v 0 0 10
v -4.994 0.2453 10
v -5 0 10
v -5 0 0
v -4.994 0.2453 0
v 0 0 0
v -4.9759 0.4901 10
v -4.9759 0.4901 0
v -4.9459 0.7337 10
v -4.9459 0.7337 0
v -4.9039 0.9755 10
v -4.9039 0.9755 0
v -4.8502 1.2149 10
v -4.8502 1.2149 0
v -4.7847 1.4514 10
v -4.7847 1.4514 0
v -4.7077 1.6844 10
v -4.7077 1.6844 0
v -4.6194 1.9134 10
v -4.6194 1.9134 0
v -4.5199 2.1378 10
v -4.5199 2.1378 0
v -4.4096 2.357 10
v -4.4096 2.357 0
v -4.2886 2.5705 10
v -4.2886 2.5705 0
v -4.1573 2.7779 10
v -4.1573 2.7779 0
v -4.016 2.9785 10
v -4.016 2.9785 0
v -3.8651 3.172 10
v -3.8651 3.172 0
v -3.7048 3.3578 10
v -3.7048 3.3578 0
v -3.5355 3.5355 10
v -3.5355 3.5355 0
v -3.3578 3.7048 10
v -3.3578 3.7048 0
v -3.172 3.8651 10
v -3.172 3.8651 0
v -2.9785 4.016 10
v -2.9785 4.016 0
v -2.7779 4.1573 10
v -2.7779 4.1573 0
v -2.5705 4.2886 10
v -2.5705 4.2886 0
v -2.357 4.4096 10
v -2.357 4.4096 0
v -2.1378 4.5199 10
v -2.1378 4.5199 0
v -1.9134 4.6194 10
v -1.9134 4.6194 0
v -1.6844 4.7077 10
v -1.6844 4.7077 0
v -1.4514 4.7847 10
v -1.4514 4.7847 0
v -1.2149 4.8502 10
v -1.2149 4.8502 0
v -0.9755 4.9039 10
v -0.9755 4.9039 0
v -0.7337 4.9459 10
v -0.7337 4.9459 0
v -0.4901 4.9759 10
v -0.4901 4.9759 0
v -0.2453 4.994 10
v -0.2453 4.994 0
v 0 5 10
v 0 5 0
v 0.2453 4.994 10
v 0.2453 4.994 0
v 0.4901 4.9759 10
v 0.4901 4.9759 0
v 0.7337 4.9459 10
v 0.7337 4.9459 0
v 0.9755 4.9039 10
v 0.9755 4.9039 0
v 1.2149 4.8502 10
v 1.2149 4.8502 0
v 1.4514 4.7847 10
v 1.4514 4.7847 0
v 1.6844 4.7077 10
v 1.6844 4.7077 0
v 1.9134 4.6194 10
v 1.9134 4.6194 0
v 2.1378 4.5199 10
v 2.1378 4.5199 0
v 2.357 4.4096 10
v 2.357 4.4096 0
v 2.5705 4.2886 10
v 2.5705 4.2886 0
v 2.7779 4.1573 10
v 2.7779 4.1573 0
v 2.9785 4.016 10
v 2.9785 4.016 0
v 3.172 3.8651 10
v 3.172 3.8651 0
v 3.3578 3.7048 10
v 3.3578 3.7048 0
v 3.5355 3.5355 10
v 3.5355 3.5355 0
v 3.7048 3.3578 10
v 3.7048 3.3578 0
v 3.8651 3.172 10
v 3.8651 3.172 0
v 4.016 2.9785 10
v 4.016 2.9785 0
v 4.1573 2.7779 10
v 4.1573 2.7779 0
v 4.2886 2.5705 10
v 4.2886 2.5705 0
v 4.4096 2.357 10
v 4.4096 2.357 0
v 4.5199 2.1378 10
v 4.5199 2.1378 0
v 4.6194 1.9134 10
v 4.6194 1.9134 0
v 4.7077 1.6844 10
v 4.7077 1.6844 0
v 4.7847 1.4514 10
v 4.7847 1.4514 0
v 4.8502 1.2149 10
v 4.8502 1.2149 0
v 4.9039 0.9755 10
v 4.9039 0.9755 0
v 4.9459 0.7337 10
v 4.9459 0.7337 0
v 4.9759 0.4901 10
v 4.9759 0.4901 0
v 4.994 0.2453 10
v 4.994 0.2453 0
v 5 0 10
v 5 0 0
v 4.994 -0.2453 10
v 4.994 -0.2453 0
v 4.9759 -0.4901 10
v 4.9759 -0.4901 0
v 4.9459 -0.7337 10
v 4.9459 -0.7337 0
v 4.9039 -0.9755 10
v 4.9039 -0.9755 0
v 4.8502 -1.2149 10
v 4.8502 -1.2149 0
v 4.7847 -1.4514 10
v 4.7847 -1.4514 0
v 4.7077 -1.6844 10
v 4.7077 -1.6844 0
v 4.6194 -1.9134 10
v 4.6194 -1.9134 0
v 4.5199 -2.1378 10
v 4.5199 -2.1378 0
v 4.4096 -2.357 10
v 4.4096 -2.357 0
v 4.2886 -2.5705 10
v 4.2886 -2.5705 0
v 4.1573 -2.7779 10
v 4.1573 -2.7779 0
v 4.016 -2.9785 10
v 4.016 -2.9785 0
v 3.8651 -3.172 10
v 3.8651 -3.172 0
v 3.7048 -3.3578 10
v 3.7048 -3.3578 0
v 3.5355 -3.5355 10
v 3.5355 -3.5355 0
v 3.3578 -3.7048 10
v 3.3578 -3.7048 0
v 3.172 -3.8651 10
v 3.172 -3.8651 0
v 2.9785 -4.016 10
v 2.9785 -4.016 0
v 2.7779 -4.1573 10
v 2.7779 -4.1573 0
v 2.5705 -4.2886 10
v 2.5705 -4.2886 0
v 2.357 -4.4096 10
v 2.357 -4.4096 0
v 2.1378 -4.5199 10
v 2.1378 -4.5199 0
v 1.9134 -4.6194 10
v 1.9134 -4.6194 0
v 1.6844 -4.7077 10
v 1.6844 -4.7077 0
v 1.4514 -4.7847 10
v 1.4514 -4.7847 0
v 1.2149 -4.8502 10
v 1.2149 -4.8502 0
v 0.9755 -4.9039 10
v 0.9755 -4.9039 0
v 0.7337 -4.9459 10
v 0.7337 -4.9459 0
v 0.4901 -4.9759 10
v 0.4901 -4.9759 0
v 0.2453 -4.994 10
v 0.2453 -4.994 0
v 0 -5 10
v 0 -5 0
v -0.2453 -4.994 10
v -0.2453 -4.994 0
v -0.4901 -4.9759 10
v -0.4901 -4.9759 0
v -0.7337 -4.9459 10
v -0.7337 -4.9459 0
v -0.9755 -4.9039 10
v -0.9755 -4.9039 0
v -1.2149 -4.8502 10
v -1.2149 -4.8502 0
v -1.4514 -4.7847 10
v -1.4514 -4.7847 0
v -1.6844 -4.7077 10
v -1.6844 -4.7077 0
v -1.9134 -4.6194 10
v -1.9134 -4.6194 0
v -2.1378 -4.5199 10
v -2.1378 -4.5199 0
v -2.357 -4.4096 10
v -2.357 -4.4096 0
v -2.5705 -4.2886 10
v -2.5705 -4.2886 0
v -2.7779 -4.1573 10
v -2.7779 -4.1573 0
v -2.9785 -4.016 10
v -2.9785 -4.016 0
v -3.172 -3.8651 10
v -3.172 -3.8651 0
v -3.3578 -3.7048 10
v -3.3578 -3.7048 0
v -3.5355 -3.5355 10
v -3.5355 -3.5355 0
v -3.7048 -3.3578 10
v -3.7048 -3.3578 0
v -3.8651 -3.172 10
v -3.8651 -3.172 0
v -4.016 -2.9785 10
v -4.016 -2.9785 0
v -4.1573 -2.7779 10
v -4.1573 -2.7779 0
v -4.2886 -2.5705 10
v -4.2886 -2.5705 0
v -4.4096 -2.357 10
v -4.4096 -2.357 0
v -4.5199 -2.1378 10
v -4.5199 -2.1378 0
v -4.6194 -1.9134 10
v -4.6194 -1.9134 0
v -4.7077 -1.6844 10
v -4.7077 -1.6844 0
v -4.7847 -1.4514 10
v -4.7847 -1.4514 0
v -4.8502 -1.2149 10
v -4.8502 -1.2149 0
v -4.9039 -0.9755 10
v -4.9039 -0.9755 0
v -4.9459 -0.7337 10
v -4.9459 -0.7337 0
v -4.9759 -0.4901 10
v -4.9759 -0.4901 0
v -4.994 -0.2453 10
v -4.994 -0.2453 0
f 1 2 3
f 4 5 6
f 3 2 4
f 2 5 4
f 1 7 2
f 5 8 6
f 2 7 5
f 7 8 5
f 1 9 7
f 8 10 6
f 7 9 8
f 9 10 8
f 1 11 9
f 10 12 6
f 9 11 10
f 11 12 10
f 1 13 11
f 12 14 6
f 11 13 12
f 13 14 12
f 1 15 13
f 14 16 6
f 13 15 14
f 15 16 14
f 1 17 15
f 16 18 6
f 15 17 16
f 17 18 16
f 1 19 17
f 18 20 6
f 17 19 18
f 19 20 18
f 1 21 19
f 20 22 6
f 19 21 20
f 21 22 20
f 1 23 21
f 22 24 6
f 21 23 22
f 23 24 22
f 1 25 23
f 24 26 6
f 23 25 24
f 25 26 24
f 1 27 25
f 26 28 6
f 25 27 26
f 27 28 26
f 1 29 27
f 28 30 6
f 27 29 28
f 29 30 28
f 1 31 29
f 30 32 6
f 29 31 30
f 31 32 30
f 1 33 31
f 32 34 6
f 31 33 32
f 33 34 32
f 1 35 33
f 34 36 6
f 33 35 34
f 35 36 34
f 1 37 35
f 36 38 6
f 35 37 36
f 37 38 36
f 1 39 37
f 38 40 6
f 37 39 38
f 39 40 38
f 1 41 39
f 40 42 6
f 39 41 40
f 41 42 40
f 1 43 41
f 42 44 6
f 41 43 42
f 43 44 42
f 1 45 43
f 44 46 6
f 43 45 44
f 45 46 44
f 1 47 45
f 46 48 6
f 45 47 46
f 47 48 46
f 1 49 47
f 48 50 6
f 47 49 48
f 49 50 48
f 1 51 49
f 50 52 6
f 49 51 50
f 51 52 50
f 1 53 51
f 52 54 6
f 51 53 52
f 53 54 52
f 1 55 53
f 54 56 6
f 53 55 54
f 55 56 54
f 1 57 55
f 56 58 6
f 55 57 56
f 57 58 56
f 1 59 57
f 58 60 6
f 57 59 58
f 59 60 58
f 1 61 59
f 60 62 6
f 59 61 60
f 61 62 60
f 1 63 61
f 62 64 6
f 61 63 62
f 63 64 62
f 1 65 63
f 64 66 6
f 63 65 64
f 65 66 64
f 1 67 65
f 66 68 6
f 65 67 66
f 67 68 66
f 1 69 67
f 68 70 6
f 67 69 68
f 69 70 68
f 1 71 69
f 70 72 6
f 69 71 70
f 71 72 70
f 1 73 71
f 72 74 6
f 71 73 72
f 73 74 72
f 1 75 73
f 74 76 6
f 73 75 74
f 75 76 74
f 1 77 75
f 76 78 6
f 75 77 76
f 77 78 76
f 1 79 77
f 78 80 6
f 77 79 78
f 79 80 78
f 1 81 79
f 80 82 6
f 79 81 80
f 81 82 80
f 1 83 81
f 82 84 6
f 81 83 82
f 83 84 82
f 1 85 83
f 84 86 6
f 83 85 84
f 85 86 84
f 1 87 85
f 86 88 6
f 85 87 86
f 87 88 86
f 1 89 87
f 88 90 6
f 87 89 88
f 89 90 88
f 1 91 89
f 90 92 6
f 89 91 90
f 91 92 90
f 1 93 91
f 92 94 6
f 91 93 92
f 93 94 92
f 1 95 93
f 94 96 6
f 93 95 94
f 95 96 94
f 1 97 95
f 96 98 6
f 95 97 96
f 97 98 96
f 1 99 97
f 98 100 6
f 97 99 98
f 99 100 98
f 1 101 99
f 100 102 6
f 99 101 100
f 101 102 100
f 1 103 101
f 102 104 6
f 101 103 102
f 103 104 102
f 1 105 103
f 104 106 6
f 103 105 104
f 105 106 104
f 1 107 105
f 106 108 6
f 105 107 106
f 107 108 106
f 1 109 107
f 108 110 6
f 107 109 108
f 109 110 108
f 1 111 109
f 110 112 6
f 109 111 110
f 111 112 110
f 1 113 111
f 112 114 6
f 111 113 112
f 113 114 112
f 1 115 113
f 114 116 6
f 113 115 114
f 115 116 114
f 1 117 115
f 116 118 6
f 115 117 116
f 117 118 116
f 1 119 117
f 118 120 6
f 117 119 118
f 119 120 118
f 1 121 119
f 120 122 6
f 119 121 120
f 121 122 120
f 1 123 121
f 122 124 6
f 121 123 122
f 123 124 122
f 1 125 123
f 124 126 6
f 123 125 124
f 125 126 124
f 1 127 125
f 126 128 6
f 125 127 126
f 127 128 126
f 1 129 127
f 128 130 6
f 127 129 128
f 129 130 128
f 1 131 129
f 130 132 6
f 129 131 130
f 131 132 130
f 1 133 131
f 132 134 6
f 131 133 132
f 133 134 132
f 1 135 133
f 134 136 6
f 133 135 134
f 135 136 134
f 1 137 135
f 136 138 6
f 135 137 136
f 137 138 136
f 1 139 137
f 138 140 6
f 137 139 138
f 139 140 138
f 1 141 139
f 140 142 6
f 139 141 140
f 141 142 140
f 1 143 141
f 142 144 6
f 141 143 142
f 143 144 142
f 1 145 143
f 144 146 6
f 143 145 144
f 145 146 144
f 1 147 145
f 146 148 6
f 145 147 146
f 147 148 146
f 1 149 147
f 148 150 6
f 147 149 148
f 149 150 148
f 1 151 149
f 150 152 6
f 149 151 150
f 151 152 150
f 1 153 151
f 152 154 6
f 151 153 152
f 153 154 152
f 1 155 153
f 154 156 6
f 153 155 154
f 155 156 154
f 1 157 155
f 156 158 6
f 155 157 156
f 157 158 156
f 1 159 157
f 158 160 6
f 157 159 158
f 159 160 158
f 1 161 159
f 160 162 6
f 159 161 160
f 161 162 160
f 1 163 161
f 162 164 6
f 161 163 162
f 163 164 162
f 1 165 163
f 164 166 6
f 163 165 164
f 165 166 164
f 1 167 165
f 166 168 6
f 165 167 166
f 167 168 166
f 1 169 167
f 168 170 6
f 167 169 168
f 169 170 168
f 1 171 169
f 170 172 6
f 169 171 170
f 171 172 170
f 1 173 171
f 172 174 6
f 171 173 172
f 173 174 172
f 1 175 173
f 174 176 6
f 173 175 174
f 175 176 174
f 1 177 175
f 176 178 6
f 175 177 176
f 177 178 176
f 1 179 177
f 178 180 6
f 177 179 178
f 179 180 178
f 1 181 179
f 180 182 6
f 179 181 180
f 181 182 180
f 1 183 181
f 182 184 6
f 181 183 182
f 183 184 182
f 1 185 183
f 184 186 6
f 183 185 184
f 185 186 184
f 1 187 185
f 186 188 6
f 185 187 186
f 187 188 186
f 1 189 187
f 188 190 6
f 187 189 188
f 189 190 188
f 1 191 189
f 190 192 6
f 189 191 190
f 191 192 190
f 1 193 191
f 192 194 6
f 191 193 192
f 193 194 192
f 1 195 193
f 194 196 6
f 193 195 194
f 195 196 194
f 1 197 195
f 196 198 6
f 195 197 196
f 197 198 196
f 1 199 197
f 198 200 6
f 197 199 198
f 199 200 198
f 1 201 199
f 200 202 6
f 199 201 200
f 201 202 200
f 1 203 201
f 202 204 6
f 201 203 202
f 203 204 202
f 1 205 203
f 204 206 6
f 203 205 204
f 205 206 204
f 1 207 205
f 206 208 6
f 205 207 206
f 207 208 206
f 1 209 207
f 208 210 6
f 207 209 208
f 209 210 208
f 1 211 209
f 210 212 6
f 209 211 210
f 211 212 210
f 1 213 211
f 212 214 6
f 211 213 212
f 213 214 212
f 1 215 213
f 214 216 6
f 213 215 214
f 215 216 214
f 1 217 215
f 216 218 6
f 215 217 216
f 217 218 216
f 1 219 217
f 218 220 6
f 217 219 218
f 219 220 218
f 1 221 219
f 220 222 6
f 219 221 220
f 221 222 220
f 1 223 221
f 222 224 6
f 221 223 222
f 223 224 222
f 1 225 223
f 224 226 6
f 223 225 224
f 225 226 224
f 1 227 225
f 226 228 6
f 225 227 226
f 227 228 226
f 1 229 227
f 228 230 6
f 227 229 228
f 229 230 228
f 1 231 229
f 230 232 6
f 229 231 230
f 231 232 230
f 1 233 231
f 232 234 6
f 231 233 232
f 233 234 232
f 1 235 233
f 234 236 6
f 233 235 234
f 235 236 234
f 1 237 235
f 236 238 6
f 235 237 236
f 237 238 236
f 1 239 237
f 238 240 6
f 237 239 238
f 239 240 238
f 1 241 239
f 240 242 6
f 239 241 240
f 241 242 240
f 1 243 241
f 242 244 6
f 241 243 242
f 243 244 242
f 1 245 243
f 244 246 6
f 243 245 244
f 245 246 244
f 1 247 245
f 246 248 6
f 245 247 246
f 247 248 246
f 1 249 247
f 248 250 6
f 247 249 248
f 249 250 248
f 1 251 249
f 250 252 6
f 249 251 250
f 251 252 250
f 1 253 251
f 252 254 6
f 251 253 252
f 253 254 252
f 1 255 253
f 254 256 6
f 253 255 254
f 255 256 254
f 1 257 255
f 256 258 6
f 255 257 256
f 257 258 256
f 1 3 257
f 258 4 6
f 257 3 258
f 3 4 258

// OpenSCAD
// Auto-generated from tests/data/feature_fixtures_manifest.json
// fixture: revolve_rectangle_profile
// fixture_type: revolve
// description: Rectangle profile revolved around Z; Phase 2 → cylinder primitive upgrade.
$fn = 96;

profile = [
    [0.000000, 0.000000],
    [5.000000, 0.000000],
    [5.000000, 10.000000],
    [0.000000, 10.000000]
];

rotate_extrude($fn=128) polygon(points=profile);
